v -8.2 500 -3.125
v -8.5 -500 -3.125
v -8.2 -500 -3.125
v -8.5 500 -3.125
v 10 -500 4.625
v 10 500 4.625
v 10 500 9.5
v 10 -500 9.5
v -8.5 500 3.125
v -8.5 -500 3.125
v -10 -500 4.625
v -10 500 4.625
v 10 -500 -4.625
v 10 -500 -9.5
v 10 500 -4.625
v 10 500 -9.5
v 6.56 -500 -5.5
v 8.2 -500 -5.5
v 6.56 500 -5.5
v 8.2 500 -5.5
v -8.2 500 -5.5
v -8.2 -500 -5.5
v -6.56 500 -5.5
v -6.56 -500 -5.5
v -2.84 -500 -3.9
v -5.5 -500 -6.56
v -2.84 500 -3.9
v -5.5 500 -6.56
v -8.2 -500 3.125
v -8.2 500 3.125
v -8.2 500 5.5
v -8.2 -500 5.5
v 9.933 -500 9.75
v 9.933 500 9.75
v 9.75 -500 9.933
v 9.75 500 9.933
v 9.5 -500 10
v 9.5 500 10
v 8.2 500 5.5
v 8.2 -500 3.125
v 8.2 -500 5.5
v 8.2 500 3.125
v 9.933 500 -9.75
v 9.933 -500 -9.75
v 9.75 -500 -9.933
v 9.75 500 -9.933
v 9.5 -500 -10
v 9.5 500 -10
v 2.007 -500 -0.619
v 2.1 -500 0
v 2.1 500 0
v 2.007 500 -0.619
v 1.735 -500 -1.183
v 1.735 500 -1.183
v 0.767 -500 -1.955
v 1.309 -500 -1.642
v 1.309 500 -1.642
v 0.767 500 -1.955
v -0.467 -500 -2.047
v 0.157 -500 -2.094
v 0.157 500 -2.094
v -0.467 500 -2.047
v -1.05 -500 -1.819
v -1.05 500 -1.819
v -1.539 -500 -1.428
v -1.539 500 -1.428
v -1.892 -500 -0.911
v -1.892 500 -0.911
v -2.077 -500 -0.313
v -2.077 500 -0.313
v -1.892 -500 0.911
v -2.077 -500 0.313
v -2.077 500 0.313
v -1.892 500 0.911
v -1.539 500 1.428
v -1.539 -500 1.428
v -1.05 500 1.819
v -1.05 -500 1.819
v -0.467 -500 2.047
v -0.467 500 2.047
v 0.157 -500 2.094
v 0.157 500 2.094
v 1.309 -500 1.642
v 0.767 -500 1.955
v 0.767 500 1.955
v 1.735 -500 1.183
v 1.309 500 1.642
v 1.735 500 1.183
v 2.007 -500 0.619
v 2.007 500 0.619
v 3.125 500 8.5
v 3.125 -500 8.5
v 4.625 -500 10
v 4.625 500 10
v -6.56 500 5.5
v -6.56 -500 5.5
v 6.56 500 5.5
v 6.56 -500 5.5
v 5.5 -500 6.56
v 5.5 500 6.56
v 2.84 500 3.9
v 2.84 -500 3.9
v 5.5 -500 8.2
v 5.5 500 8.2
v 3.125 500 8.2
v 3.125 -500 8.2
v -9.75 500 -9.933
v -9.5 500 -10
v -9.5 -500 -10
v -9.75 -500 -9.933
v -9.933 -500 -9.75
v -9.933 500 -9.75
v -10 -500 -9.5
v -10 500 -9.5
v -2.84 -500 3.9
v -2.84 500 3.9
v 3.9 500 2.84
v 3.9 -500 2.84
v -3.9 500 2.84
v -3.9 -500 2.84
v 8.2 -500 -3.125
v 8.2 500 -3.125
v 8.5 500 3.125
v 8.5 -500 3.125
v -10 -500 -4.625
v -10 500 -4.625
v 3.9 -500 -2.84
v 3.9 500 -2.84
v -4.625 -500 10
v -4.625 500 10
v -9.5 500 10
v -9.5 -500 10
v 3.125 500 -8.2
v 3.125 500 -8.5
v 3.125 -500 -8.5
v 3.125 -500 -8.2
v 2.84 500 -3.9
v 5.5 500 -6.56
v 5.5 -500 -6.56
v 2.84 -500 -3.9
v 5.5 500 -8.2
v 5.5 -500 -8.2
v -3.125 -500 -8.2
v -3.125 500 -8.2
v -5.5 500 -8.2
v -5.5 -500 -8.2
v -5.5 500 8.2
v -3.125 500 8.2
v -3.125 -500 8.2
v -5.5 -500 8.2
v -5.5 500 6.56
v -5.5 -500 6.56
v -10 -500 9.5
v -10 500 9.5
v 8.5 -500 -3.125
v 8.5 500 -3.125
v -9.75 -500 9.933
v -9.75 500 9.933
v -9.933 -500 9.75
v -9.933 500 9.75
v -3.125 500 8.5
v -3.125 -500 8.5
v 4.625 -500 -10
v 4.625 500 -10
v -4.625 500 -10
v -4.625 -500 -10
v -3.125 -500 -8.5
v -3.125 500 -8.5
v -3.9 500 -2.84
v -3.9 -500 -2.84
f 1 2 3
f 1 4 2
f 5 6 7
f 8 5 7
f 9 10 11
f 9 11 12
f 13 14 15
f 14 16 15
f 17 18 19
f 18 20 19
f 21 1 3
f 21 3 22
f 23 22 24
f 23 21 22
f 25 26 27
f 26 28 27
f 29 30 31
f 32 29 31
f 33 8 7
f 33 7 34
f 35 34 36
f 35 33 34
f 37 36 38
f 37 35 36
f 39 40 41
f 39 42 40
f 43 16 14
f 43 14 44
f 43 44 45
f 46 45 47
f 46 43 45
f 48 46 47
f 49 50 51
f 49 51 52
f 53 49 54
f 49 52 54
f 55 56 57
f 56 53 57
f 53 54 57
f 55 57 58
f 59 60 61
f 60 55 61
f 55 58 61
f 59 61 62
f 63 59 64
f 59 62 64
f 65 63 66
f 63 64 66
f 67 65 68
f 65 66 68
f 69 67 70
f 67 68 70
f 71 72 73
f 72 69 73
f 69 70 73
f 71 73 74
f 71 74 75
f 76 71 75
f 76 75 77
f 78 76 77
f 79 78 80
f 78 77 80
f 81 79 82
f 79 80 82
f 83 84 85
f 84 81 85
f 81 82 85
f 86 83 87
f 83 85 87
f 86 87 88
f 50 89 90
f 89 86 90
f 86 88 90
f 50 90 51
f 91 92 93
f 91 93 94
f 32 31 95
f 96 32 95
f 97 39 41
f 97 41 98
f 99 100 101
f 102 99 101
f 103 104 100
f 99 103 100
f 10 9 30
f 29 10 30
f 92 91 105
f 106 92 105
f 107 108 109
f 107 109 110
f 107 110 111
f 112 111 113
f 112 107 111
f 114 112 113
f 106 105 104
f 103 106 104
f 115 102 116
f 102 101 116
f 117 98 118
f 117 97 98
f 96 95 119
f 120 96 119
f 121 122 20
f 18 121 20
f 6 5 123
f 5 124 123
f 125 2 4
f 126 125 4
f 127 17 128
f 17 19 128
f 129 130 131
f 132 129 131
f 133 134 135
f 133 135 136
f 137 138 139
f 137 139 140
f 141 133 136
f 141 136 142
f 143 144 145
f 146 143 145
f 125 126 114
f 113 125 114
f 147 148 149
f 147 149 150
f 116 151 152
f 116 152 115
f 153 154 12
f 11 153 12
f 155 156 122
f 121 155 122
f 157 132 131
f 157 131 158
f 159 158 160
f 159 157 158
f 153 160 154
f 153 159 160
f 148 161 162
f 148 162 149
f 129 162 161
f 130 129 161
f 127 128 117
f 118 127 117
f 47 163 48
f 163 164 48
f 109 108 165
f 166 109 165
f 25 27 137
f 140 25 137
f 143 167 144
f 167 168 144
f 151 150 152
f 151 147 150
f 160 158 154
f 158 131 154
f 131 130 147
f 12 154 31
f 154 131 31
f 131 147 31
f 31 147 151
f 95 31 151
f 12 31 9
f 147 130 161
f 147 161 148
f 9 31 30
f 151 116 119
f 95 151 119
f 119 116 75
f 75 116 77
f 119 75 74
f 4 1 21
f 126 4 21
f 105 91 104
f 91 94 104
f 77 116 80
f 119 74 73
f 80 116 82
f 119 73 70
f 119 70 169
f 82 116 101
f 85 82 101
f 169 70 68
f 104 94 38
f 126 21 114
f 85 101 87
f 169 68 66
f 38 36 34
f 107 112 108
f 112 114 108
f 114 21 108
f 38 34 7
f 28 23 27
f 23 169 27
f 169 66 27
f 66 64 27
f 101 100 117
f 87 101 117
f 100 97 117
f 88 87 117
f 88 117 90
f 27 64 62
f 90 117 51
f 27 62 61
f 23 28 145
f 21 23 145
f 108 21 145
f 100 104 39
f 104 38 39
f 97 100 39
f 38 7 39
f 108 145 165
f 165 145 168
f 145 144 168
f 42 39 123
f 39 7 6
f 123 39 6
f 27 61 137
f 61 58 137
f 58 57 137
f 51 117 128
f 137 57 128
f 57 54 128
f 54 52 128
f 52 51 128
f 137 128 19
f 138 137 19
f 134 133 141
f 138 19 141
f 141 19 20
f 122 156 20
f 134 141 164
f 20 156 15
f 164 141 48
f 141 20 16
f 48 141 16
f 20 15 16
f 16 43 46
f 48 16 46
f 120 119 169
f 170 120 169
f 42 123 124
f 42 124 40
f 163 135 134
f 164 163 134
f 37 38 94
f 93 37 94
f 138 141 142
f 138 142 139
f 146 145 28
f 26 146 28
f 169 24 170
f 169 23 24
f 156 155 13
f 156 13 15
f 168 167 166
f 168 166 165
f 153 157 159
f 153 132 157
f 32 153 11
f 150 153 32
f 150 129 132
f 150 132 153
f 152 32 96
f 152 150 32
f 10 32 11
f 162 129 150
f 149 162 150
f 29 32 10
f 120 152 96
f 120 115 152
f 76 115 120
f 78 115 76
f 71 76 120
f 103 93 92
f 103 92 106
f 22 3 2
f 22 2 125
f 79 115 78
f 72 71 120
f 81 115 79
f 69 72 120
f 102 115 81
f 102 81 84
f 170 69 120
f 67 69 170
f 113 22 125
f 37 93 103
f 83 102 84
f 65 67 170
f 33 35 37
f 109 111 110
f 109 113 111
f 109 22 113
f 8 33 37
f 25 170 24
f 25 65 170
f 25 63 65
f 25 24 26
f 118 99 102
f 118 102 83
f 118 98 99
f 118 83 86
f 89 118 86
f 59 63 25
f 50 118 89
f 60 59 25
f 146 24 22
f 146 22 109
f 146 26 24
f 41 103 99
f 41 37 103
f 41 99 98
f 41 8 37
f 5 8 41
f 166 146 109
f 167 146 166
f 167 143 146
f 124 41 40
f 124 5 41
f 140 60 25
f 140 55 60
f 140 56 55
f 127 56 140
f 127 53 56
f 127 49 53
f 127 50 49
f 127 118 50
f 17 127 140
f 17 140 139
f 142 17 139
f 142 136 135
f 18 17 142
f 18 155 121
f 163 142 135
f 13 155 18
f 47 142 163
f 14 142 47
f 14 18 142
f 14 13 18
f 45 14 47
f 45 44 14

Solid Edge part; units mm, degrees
sketch "Sketch1" plane through (0, 0, 0) normal (0, -1, 0) x (1, 0, 0)
  line L0 (10, -10) -> (10, 10)
  line L1 (10, 10) -> (-10, 10)
  line L2 (-10, 10) -> (-10, -10)
  line L3 (-10, -10) -> (10, -10)
  circle A0 centre (0, 0) radius 2.1
  dimension "D1" = 1.64
  dimension "D2" = 1.8
  dimension "D3" = 20
  dimension "D4" = 20
  dimension "D5" = 3.9
  dimension "D6" = 6.25
  dimension "D7" = 11
extrude "Protrusion1" add sketch "Sketch1" along normal mid plane 1000
sketch "Sketch2" plane through (0, 0, 0) normal (0, -1, 0) x (1, 0, 0)
  line L0 (5.5, 6.56) -> (2.84, 3.9)
  line L1 (2.84, 3.9) -> (-2.84, 3.9)
  line L2 (-5.5, 6.56) -> (-2.84, 3.9)
  line L3 (-5.5, 8.2) -> (-5.5, 6.56)
  line L4 (-3.125, 8.2) -> (-5.5, 8.2)
  line L5 (-3.125, 10) -> (-3.125, 8.2)
  line L6 (-3.125, 10) -> (3.125, 10)
  line L7 (3.125, 10) -> (3.125, 8.2)
  line L8 (3.125, 8.2) -> (5.5, 8.2)
  line L9 (5.5, 8.2) -> (5.5, 6.56)
extrude "Cutout1" cut sketch "Sketch2" along normal through all and the other way through all
chamfer "Chaflán_1" distance 1.5 angle 45 2 edges at (-3.125, 0, 10) (3.125, 0, 10)
pattern_circular "Pattern1" count 4 over 360 about axis through (0, -500, 0) along (0, 1, 0) of "Cutout1", "Chaflán_1"
fillet "Redondeo_3" radius 0.5 4 edges at (-10, 0, 10) (10, 0, 10) (10, 0, -10) (-10, 0, -10)
